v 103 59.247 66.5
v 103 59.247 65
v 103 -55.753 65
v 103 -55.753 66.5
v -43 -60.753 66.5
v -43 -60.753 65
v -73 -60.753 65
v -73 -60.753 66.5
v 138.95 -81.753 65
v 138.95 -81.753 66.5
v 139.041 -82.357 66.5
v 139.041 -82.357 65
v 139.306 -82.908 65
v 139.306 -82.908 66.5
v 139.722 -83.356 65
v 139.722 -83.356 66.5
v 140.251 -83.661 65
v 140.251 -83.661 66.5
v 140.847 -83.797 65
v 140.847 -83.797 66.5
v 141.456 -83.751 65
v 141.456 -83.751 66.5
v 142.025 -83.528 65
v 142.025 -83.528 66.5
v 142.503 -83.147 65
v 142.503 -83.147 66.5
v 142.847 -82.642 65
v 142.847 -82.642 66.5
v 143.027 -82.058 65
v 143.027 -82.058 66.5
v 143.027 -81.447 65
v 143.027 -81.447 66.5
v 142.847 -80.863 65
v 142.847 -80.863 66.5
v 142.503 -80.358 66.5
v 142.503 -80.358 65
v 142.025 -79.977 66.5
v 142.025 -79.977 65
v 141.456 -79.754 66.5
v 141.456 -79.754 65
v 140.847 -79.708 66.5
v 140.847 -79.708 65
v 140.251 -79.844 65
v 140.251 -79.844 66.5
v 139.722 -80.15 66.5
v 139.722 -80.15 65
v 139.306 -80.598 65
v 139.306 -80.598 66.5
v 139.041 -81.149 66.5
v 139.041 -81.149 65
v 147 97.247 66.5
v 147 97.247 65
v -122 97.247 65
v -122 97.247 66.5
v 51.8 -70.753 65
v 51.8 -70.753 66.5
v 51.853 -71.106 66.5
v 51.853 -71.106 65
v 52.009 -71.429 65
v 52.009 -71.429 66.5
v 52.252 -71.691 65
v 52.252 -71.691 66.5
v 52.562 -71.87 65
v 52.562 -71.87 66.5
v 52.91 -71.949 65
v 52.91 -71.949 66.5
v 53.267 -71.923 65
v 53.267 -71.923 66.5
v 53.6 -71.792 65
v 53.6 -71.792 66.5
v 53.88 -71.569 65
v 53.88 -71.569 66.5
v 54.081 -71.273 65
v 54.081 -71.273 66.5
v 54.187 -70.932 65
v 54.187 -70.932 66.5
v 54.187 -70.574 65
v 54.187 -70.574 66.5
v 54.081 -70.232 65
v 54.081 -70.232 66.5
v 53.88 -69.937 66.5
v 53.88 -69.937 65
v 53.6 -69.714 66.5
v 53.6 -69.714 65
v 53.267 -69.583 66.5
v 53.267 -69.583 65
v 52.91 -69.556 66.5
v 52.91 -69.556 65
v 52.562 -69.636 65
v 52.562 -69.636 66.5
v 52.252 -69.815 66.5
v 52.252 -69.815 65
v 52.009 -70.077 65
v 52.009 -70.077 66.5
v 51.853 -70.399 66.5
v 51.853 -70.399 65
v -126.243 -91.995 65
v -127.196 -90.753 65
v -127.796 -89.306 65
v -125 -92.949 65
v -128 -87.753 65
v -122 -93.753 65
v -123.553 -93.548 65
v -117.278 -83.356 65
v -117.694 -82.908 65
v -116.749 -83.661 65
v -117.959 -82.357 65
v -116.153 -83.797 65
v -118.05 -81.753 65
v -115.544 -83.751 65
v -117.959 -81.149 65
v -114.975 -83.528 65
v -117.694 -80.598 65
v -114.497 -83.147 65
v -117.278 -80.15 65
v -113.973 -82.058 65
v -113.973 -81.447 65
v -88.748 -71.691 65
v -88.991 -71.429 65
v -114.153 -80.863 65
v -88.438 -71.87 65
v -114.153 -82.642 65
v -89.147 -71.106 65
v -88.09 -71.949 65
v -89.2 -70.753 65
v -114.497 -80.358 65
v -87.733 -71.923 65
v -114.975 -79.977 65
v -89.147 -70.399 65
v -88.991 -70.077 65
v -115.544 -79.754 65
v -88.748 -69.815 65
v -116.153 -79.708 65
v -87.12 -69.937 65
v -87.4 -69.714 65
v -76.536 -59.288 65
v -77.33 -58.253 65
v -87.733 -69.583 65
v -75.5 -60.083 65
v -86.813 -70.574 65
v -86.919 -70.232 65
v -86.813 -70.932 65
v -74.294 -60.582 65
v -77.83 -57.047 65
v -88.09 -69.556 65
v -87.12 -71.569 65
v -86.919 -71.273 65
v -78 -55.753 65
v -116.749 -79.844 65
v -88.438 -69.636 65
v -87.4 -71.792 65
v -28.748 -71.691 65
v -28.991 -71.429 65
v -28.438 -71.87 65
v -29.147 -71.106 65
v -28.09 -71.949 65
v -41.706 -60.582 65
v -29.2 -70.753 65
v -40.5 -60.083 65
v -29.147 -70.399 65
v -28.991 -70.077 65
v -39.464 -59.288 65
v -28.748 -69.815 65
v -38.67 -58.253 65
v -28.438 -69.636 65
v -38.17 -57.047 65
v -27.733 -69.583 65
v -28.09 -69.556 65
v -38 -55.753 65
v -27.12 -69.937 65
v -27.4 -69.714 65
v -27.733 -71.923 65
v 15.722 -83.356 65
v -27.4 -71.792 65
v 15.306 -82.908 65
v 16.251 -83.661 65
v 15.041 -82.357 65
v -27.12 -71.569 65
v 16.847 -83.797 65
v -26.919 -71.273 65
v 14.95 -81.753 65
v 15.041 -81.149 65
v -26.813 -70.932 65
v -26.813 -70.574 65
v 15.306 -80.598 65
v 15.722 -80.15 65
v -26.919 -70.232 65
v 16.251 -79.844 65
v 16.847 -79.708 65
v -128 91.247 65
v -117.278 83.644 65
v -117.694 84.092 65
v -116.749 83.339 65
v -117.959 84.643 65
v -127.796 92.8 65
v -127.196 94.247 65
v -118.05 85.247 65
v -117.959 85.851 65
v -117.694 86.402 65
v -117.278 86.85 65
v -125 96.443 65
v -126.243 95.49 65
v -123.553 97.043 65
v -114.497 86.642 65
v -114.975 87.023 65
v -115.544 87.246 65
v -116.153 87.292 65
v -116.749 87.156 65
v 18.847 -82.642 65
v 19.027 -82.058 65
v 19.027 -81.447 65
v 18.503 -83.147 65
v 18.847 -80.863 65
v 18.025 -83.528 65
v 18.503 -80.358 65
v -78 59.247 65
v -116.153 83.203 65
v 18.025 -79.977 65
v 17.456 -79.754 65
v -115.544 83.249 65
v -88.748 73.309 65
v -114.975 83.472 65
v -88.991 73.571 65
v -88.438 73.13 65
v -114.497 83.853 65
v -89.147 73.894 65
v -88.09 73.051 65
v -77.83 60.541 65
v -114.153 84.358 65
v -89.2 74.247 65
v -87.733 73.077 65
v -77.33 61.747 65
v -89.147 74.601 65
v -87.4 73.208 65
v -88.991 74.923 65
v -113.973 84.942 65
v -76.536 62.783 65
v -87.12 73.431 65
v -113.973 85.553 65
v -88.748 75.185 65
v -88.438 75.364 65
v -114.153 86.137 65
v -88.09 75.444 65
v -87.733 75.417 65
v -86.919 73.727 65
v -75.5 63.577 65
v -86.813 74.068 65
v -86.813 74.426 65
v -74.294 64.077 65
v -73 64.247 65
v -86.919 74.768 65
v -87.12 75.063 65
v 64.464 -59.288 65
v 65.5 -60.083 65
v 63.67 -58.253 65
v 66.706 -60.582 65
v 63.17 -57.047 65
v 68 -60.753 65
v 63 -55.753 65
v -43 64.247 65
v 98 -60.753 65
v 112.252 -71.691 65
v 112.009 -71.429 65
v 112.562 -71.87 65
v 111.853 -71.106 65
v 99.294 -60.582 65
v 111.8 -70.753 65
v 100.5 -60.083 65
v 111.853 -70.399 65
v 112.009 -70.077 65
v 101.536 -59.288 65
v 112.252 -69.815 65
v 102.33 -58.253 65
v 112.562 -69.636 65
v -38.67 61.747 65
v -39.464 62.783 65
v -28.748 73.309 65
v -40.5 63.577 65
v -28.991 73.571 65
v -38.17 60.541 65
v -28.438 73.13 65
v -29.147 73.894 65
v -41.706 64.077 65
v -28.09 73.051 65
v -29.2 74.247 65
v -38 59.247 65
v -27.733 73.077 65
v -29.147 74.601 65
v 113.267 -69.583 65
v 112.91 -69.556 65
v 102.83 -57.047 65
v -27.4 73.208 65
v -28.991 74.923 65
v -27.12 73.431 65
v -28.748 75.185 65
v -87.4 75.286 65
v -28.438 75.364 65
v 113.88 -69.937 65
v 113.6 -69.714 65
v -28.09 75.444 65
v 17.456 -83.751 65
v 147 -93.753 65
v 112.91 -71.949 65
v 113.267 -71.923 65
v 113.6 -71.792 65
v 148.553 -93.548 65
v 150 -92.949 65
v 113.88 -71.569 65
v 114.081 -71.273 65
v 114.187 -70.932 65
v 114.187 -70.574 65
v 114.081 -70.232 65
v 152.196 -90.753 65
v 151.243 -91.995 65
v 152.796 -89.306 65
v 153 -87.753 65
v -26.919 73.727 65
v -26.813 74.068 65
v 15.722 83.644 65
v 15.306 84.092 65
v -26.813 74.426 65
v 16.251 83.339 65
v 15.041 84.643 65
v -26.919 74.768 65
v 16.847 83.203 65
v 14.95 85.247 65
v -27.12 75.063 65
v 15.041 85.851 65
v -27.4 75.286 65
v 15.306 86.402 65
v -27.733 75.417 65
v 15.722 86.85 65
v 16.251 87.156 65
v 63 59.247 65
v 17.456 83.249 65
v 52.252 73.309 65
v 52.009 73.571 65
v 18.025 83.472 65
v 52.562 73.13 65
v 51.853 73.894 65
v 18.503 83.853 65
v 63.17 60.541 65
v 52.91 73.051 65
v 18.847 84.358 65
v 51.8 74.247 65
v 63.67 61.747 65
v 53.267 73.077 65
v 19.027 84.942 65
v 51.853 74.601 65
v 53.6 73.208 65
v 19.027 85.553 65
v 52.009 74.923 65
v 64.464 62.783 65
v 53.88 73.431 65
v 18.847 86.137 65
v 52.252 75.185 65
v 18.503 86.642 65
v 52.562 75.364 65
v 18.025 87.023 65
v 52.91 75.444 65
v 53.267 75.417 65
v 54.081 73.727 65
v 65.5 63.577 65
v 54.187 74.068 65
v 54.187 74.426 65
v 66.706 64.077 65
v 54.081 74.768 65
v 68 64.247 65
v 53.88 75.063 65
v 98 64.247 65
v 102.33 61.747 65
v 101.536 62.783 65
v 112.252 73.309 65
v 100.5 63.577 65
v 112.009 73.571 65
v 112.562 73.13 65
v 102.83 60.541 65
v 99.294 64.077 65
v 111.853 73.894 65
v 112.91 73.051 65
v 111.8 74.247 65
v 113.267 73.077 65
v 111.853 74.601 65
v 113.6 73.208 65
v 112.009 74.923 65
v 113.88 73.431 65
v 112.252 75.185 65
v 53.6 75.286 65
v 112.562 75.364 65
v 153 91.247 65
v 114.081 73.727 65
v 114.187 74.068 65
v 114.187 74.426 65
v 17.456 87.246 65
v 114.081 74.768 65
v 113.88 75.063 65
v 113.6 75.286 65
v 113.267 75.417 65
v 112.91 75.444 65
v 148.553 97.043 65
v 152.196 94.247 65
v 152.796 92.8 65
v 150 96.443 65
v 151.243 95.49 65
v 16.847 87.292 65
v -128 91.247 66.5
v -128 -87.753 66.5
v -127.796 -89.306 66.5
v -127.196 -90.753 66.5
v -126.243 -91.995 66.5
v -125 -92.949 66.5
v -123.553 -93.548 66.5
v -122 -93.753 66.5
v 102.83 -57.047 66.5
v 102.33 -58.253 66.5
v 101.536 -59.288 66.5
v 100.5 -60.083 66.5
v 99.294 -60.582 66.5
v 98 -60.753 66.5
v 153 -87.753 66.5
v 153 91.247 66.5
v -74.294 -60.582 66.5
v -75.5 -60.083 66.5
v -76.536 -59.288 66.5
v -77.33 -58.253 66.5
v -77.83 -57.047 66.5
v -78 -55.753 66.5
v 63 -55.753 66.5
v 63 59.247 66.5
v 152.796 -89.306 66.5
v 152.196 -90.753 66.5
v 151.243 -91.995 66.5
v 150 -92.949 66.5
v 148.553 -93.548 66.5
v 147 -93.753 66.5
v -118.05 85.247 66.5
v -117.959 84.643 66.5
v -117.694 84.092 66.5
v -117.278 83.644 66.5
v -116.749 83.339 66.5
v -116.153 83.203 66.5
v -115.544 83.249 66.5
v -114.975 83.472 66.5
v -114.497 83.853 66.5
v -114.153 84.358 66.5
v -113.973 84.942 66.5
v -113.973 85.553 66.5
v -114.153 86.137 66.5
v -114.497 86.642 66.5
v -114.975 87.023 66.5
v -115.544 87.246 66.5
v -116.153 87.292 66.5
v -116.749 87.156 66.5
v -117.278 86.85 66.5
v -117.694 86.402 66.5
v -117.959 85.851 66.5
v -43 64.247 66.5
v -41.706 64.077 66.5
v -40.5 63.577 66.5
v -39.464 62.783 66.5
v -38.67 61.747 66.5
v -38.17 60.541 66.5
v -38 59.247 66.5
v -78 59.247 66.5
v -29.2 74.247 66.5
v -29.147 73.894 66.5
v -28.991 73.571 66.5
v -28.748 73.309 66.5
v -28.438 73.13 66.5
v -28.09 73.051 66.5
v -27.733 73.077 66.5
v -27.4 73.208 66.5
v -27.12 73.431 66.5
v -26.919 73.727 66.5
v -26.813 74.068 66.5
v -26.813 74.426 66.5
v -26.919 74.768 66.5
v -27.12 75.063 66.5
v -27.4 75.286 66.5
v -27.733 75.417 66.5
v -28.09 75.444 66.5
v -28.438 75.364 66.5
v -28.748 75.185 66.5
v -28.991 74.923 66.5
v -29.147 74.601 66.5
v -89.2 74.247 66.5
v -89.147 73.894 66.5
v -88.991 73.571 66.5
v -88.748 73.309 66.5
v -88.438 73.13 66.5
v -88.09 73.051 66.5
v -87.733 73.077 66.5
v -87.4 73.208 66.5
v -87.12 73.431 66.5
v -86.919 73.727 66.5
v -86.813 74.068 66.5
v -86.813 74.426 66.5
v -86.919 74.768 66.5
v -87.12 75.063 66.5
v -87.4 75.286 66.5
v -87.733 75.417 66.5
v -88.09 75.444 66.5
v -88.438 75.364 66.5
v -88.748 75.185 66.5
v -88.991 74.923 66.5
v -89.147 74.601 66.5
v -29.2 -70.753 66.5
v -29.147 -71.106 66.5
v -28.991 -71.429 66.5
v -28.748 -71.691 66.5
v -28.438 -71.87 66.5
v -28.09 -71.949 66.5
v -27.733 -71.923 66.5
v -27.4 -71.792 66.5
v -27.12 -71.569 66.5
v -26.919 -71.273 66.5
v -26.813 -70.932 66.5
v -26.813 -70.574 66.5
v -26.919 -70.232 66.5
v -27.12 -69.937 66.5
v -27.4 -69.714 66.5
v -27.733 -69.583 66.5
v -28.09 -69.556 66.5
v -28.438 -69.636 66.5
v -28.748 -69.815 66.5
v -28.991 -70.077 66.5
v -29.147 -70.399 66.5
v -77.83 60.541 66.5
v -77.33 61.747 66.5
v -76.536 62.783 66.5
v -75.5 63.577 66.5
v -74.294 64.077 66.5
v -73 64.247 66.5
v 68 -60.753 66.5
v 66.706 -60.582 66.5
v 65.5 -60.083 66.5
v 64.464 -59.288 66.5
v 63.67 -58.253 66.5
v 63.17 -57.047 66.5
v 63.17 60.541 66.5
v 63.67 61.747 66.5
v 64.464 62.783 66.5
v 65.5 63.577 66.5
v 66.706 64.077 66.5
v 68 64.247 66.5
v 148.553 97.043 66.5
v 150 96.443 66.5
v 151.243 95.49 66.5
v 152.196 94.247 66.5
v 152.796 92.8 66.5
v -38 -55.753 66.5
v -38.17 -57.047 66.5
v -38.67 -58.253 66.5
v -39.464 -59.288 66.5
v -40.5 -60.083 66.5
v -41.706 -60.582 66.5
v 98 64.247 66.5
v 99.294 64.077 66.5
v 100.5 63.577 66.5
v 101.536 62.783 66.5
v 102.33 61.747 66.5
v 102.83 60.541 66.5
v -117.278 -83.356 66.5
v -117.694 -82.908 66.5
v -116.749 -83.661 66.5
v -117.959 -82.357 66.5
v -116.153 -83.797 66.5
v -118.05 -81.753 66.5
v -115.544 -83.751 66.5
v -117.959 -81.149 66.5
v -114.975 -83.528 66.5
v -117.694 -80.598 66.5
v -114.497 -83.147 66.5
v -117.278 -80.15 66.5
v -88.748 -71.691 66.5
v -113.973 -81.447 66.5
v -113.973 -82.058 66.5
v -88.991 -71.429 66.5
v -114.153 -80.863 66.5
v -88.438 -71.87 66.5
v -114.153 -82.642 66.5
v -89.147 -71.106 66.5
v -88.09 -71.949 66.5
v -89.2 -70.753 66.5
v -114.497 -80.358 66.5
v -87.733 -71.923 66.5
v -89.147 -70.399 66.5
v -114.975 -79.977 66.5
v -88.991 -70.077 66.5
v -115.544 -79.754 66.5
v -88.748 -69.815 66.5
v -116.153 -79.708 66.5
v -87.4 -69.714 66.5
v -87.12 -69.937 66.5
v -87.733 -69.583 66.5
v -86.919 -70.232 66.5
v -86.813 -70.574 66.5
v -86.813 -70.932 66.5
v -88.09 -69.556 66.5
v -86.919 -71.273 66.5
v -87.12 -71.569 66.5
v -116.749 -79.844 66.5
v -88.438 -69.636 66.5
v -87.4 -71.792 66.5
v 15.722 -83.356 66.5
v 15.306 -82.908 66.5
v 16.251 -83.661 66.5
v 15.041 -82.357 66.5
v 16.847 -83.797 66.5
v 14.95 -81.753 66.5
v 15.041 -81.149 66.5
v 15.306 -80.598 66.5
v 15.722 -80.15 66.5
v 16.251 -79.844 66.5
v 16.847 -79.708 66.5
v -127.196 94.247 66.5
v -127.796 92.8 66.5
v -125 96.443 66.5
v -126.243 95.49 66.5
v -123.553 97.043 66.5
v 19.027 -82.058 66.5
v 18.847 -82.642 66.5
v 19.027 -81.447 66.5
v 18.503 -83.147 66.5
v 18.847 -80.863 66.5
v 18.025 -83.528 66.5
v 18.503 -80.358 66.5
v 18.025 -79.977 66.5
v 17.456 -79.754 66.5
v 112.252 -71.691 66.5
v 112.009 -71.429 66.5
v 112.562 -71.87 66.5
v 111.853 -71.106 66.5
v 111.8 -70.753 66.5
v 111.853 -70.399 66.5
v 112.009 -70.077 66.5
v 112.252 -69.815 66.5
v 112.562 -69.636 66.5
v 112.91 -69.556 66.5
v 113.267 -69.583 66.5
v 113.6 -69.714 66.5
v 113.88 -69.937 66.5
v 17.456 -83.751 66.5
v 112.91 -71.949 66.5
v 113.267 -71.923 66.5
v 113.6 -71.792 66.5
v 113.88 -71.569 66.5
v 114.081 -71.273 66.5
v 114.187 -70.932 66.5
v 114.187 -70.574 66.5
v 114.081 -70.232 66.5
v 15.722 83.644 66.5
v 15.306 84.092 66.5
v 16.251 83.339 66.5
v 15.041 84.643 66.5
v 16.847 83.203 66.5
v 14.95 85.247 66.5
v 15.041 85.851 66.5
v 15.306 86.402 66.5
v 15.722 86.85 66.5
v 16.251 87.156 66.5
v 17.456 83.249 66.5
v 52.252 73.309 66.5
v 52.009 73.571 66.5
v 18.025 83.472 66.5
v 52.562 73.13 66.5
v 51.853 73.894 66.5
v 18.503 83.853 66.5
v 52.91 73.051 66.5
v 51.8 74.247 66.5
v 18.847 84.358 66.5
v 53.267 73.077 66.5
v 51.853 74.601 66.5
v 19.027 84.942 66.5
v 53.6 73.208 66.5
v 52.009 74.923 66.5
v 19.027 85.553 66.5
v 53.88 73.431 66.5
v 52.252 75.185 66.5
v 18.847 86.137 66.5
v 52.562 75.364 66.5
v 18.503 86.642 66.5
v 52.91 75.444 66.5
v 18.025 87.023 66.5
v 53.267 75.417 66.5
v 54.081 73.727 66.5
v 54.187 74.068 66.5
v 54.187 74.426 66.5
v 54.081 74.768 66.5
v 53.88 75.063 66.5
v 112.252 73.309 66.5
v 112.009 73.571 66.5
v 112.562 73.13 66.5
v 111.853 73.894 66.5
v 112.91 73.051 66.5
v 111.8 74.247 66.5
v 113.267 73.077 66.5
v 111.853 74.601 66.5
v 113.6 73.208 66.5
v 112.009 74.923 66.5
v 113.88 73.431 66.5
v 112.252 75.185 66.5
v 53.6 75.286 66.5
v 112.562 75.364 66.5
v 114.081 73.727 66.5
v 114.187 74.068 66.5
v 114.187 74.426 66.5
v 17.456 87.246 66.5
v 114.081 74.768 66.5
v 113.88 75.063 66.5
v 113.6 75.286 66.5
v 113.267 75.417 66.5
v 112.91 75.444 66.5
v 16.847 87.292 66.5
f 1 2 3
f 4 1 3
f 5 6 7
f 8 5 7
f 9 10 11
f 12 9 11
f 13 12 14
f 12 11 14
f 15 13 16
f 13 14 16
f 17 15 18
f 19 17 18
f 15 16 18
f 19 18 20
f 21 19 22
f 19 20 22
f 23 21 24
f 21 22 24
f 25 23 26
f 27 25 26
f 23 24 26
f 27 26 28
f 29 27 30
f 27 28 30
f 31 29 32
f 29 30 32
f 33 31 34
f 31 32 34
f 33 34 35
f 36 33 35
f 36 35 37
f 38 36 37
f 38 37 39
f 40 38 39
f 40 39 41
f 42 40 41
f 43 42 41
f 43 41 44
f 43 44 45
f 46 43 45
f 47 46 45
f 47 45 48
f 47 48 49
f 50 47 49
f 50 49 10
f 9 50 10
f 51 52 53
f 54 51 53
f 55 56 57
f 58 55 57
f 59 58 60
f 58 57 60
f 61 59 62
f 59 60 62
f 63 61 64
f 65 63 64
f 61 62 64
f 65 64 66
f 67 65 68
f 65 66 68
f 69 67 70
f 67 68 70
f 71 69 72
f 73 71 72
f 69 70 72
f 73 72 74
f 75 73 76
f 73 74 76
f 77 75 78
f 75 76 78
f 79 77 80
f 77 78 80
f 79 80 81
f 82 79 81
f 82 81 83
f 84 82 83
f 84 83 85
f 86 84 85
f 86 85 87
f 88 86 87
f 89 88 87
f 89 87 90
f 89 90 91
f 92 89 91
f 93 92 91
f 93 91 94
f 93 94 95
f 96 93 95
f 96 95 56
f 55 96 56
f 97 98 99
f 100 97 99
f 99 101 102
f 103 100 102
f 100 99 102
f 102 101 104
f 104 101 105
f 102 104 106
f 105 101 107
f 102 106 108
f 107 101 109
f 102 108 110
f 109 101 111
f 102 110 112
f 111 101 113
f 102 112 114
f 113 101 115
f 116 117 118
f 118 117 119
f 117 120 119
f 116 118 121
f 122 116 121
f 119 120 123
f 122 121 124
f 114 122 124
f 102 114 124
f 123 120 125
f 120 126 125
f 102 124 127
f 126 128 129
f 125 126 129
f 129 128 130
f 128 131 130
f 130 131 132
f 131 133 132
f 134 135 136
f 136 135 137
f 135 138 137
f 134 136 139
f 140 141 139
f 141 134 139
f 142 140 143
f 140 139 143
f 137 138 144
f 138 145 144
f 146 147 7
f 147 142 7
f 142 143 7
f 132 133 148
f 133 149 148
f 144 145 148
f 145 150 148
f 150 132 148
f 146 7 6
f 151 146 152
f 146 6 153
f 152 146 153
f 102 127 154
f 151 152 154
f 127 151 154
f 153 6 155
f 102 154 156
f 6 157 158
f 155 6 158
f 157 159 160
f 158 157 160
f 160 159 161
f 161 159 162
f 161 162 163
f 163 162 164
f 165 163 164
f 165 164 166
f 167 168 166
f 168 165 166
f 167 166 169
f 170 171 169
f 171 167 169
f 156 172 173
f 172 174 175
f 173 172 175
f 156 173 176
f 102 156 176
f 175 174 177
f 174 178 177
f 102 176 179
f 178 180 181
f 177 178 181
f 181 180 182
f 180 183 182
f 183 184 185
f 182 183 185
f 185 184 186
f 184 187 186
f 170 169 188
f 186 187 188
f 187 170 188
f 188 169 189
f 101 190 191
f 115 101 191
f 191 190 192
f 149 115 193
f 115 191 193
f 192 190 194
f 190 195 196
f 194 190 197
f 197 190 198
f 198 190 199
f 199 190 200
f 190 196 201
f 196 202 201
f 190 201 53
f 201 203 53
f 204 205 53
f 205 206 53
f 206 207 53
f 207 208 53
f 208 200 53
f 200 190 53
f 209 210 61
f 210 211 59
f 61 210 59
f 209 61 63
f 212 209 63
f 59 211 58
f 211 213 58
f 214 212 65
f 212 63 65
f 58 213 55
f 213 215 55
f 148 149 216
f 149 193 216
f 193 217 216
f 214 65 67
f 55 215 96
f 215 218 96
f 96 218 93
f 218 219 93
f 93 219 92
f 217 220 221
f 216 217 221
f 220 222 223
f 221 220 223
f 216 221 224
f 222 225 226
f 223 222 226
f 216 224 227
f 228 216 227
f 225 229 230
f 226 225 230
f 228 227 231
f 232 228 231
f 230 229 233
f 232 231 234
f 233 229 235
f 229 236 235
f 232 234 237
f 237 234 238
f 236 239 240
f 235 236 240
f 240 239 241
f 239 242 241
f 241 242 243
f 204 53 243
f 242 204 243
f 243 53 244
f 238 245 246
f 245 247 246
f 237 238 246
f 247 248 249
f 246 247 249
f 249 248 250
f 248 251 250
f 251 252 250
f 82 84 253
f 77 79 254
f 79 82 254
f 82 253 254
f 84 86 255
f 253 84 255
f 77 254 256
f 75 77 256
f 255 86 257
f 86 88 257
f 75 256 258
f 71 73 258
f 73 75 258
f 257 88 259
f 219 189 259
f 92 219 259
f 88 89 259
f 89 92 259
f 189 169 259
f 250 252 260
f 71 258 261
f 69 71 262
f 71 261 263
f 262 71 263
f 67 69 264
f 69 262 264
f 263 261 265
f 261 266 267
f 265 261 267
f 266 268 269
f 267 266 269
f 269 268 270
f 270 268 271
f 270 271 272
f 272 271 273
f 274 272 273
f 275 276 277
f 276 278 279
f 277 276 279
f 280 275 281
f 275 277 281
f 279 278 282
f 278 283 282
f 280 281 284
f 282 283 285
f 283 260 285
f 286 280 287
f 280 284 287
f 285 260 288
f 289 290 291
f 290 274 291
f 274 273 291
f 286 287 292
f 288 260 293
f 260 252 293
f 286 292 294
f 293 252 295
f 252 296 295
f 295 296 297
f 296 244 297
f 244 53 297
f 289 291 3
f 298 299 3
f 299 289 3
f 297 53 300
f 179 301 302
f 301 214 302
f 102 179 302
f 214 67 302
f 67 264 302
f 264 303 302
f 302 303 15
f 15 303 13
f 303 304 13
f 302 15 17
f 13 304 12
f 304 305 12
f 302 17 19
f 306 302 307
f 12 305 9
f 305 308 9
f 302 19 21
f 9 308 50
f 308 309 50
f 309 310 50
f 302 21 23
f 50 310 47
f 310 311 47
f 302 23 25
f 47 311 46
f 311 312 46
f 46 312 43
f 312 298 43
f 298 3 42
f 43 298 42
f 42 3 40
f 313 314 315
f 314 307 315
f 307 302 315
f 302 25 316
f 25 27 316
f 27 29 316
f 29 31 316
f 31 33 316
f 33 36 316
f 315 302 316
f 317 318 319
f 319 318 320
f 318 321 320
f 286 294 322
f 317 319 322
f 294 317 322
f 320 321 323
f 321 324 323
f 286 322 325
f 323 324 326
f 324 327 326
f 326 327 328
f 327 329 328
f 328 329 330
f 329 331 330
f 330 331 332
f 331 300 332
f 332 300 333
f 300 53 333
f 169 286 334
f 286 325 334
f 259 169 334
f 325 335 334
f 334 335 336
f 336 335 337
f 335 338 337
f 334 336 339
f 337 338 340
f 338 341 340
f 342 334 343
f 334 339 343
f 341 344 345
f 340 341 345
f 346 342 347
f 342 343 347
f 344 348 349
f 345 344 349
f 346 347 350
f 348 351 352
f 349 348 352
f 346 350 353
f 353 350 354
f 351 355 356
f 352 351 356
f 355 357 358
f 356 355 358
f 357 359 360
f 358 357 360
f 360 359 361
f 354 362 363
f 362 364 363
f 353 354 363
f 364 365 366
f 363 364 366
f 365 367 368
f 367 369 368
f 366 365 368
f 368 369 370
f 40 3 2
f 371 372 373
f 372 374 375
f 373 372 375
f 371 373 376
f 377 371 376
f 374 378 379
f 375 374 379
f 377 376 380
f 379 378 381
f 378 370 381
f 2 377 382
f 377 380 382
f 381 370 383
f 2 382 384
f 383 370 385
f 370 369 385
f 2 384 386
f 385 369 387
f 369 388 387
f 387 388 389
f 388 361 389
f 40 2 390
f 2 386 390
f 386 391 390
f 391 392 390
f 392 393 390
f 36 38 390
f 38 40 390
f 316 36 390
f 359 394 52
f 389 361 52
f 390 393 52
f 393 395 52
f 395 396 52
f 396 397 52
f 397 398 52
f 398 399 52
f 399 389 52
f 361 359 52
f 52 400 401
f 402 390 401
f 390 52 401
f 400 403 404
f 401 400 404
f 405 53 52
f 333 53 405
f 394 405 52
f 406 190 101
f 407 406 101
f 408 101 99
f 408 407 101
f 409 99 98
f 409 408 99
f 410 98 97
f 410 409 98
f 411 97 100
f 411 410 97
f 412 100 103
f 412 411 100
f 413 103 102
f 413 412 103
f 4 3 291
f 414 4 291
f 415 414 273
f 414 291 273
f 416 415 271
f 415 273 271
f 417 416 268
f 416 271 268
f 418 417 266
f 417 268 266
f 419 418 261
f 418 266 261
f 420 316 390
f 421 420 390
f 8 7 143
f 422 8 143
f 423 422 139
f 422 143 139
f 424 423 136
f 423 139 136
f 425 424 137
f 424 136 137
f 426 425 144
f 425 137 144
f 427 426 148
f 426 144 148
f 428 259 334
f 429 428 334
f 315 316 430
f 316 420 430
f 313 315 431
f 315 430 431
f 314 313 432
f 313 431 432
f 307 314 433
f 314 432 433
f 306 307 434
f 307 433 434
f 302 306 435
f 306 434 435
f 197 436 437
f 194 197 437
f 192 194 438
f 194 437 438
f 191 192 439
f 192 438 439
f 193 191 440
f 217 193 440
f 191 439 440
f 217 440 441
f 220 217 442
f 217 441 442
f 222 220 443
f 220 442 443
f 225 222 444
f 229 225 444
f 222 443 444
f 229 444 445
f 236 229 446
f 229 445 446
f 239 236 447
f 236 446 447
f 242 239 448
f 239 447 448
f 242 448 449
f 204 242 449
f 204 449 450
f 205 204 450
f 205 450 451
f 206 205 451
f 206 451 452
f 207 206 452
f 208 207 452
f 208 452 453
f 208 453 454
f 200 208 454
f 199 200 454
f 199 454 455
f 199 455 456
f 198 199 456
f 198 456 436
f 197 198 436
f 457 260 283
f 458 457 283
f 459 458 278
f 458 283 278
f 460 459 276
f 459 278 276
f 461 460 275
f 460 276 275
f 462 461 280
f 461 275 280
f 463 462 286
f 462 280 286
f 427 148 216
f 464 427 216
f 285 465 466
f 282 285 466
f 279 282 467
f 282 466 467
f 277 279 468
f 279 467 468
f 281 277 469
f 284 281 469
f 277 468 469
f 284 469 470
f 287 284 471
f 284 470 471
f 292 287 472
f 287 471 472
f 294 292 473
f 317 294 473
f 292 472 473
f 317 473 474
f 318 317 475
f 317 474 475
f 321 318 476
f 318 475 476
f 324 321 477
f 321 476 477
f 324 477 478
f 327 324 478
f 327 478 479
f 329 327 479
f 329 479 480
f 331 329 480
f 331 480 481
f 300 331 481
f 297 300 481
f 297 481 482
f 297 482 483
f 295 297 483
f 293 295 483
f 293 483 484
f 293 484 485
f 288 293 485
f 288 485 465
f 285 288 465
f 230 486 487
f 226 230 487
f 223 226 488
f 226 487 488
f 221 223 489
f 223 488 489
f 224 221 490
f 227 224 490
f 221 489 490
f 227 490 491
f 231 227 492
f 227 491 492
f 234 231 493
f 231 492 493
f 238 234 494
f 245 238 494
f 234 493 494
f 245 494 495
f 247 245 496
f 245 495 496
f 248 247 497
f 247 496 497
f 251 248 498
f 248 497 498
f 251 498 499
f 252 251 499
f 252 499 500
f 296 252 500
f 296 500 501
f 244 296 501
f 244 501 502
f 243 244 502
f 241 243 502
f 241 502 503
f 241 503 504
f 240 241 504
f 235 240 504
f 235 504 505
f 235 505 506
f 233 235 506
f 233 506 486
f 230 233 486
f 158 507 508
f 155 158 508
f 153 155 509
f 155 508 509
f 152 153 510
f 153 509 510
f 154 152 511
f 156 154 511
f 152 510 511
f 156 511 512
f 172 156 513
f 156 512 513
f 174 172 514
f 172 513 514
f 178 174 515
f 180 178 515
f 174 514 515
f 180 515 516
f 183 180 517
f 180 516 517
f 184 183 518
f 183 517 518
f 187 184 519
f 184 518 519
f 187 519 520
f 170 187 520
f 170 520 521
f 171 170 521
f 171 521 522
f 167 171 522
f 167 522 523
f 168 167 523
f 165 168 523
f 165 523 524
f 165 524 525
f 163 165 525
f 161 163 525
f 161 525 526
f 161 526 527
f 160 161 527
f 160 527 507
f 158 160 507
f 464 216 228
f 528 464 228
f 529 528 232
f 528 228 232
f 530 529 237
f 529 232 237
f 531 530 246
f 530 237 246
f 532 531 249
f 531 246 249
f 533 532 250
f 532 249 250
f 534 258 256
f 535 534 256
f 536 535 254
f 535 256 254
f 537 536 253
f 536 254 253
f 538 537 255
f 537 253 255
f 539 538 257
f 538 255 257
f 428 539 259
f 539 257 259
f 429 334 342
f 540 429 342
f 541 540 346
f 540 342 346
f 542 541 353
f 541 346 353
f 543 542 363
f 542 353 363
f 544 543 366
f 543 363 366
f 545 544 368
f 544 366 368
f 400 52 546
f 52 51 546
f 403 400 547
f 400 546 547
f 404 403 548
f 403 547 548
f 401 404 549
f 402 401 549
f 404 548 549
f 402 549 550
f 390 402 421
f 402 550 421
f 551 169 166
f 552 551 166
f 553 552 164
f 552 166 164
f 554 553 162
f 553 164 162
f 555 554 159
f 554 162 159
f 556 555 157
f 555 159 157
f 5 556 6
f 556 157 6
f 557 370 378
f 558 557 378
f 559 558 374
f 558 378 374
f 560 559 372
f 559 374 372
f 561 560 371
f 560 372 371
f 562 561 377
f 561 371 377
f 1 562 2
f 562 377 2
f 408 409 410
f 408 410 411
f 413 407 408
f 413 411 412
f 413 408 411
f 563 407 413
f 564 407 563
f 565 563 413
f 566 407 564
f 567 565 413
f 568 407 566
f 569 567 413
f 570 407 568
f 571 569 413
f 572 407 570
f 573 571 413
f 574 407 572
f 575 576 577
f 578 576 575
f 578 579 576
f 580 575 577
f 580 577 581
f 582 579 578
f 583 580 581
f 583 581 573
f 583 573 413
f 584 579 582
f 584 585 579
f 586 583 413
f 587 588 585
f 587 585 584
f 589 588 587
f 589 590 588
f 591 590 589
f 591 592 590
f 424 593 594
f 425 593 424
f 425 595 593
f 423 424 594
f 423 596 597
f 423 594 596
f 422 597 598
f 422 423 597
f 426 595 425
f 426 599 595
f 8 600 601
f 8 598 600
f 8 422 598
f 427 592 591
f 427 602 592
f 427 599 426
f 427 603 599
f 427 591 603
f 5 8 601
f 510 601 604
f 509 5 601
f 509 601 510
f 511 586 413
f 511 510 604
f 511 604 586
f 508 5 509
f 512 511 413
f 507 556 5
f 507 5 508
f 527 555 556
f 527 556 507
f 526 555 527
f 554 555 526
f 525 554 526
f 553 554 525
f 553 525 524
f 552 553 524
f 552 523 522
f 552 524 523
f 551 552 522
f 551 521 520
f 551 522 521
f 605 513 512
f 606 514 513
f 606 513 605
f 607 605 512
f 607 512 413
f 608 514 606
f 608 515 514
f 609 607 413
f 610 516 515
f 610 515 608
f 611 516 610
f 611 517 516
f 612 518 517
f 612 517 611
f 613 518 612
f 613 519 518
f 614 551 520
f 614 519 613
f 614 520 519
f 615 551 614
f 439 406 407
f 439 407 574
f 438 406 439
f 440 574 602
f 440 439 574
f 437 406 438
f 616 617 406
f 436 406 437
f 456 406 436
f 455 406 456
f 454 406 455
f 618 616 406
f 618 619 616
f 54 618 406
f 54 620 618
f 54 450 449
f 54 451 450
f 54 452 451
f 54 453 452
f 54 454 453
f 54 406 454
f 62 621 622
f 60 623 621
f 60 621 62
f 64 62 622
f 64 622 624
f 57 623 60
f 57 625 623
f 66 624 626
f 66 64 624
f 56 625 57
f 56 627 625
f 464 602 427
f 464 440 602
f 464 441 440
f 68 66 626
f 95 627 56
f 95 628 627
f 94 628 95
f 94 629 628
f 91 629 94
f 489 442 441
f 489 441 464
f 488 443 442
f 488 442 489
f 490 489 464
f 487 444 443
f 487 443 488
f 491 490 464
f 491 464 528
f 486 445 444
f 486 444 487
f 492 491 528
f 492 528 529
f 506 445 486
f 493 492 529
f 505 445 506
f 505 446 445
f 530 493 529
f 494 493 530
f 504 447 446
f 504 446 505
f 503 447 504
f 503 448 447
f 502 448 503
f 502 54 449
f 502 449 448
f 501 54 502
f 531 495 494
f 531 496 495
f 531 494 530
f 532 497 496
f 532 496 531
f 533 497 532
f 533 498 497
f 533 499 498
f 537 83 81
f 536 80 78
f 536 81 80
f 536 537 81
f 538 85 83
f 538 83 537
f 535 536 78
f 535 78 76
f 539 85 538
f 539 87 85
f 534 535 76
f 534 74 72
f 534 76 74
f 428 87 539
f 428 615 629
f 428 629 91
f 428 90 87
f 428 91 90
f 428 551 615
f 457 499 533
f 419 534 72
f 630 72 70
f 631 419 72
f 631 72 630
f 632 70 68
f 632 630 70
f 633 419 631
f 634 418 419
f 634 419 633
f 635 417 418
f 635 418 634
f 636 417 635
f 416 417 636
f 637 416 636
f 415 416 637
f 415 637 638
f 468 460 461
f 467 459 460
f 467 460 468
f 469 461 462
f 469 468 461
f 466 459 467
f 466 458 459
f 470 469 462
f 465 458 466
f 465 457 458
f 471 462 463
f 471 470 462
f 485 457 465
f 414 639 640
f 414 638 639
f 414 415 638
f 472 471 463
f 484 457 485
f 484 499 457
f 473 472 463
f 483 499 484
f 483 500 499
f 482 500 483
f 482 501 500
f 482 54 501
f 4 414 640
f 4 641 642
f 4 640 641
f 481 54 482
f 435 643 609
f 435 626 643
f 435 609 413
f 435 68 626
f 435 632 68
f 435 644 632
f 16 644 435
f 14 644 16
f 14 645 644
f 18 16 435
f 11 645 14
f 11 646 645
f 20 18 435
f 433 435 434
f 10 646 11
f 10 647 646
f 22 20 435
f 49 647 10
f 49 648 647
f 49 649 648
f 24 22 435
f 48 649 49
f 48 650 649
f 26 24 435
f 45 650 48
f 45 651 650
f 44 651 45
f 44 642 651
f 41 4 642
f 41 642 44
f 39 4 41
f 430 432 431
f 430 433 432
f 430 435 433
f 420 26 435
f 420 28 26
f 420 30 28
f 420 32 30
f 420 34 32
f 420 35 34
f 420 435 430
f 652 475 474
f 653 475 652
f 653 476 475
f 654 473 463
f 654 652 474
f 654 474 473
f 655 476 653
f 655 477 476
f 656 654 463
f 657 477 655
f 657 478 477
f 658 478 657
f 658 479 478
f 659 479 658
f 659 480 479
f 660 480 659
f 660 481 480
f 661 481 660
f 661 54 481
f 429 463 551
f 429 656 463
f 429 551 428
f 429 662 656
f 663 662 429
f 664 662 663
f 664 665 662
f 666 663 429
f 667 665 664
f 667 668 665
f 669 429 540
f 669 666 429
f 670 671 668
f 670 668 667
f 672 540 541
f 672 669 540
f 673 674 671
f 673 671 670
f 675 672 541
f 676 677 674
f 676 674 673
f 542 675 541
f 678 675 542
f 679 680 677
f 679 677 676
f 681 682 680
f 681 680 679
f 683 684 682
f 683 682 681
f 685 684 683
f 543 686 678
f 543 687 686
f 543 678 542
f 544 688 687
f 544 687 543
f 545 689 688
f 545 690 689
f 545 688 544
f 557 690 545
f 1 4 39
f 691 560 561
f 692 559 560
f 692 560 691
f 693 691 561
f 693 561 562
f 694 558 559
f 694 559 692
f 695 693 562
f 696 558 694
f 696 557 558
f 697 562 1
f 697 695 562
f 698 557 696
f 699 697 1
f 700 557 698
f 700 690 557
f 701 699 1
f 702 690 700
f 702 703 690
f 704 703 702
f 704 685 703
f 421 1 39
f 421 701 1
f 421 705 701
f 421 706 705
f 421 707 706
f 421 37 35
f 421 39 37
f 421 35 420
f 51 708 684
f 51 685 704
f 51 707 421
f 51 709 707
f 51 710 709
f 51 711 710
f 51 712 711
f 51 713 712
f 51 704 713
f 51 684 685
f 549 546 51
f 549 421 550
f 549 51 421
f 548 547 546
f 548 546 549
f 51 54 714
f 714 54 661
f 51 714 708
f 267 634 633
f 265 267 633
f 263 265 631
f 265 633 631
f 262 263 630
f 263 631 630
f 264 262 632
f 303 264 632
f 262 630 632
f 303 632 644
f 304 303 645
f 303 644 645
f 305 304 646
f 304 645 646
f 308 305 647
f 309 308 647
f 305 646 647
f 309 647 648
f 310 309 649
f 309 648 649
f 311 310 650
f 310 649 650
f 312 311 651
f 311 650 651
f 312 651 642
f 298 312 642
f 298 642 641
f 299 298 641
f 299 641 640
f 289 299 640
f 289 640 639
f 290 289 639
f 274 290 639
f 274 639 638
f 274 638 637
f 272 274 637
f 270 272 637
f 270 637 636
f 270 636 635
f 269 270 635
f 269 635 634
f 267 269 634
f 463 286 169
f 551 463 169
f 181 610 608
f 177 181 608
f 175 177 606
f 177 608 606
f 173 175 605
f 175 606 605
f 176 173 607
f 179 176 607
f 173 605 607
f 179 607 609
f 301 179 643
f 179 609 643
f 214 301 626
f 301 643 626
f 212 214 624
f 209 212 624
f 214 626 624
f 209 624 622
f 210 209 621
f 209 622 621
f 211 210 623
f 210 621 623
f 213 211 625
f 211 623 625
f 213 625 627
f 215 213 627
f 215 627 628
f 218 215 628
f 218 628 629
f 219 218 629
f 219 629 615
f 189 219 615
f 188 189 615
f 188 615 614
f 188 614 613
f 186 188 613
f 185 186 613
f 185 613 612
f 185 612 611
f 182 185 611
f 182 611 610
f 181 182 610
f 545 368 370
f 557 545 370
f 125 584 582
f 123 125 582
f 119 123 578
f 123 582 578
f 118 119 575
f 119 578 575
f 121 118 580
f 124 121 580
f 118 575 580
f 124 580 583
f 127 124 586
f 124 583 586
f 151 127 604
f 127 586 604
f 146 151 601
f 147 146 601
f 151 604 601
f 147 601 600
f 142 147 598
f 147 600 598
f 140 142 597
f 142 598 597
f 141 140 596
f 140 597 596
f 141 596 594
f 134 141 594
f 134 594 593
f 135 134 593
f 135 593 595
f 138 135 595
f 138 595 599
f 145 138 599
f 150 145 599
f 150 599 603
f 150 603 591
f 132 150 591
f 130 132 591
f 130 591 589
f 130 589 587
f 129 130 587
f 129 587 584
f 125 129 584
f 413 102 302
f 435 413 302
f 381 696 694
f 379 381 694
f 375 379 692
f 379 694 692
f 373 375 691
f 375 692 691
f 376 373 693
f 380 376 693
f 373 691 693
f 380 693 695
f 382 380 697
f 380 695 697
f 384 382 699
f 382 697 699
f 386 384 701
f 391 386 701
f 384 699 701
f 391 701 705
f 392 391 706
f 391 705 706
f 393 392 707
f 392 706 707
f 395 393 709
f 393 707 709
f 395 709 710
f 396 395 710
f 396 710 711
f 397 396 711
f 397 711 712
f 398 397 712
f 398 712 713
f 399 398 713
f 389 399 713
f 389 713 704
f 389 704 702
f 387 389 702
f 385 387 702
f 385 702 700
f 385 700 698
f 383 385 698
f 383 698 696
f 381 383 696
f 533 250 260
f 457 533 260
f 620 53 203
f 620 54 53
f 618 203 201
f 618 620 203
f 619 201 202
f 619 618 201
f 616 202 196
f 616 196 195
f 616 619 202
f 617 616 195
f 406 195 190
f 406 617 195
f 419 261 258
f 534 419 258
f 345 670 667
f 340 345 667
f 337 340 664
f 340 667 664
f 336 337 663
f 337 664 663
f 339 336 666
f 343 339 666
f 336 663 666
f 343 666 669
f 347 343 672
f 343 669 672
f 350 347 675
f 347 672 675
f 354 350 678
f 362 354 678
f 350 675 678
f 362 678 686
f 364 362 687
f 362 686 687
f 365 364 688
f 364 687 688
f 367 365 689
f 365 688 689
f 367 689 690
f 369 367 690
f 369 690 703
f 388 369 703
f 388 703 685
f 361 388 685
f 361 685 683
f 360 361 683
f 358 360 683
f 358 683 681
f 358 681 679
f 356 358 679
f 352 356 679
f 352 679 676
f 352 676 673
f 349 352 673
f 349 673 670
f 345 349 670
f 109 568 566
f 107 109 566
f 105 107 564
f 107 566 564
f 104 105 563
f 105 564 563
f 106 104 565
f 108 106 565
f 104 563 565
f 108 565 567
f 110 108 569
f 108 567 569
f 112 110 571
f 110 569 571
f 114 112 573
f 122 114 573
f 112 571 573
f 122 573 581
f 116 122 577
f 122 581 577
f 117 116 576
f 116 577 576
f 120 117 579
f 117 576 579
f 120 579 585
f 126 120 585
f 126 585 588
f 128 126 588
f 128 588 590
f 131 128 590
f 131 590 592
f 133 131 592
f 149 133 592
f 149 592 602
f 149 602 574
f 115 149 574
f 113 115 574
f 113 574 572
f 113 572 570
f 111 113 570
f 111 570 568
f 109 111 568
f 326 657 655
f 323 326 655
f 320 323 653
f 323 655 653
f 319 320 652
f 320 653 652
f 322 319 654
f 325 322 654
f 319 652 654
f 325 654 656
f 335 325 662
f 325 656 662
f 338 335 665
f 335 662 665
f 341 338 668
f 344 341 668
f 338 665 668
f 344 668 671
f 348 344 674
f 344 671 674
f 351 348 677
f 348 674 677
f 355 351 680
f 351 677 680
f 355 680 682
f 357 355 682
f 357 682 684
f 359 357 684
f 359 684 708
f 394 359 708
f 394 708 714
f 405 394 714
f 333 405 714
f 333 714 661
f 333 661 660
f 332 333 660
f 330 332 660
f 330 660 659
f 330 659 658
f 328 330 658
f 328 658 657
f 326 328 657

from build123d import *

# Parameters (mm, degrees)
F1_DEPTH = 1.5
F2_D     = 4.1
F3_R     = 6
F4_D     = 2.4


with BuildPart() as f1:
    # F0 (on Top) → F1 (new body)
    with BuildSketch(Plane.XY):
        Polygon((155, 99.2472513323), (-126, 99.2472513323), (-126, -91.7527486677), (-1.5, -91.7527486677), (30.5, -91.7527486677), (155, -91.7527486677), align=None)
        with BuildLine():
            ThreePointArc((-76, 61.2472513323), (-74.5355339059, 64.7827852383), (-71, 66.2472513323))
            Line((-71, 66.2472513323), (-41, 66.2472513323))
            ThreePointArc((-41, 66.2472513323), (-37.4644660941, 64.7827852383), (-36, 61.2472513323))
            Line((-36, 61.2472513323), (-36, -53.7527486677))
            ThreePointArc((-36, -53.7527486677), (-37.4644660941, -57.2882825736), (-41, -58.7527486677))
            Line((-41, -58.7527486677), (-71, -58.7527486677))
            ThreePointArc((-71, -58.7527486677), (-74.5355339059, -57.2882825736), (-76, -53.7527486677))
            Line((-76, -53.7527486677), (-76, 61.2472513323))
        make_face(mode=Mode.SUBTRACT)
        with BuildLine():
            Line((105, 61.2472513323), (105, -53.7527486677))
            ThreePointArc((105, -53.7527486677), (103.5355339059, -57.2882825736), (100, -58.7527486677))
            Line((100, -58.7527486677), (70, -58.7527486677))
            ThreePointArc((70, -58.7527486677), (66.4644660941, -57.2882825736), (65, -53.7527486677))
            Line((65, -53.7527486677), (65, 61.2472513323))
            ThreePointArc((65, 61.2472513323), (66.4644660941, 64.7827852383), (70, 66.2472513323))
            Line((70, 66.2472513323), (100, 66.2472513323))
            ThreePointArc((100, 66.2472513323), (103.5355339059, 64.7827852383), (105, 61.2472513323))
        make_face(mode=Mode.SUBTRACT)
    extrude(amount=F1_DEPTH)

    # F2 (through all)
    with Locations(Plane(origin=(0, 0, 0), x_dir=(1, 0, 0), z_dir=(0, 0, -1))):
        with Locations((-114, -87.2472513323), (19, -87.2472513323), (143, 79.7527486677), (-114, 79.7527486677), (19, 79.7527486677)):
            Hole(F2_D / 2)

    # F3
    f3_edges = [f1.edges().sort_by_distance(p)[0] for p in [
        (-126, 99.247251, 0.75),
        (-126, -91.752749, 0.75),
        (155, -91.752749, 0.75),
        (155, 99.247251, 0.75),
    ]]
    fillet(f3_edges, radius=F3_R)

    # F4 (through all)
    with Locations(Plane(origin=(0, 0, 0), x_dir=(1, 0, 0), z_dir=(0, 0, -1))):
        with Locations((-26, -76.2472513323), (-86, -76.2472513323), (-26, 68.7527486677), (-86, 68.7527486677), (55, -76.2472513323), (115, -76.2472513323), (115, 68.7527486677), (55, 68.7527486677)):
            Hole(F4_D / 2)


with BuildPart() as f1_1:
    # F5: moved
    add(f1.part.moved(Location((0, 0, 65))))


with BuildPart() as f1_2:
    # F6: moved
    add(f1_1.part.moved(Location((-2, -2, 0))))


solid = f1_2.part
